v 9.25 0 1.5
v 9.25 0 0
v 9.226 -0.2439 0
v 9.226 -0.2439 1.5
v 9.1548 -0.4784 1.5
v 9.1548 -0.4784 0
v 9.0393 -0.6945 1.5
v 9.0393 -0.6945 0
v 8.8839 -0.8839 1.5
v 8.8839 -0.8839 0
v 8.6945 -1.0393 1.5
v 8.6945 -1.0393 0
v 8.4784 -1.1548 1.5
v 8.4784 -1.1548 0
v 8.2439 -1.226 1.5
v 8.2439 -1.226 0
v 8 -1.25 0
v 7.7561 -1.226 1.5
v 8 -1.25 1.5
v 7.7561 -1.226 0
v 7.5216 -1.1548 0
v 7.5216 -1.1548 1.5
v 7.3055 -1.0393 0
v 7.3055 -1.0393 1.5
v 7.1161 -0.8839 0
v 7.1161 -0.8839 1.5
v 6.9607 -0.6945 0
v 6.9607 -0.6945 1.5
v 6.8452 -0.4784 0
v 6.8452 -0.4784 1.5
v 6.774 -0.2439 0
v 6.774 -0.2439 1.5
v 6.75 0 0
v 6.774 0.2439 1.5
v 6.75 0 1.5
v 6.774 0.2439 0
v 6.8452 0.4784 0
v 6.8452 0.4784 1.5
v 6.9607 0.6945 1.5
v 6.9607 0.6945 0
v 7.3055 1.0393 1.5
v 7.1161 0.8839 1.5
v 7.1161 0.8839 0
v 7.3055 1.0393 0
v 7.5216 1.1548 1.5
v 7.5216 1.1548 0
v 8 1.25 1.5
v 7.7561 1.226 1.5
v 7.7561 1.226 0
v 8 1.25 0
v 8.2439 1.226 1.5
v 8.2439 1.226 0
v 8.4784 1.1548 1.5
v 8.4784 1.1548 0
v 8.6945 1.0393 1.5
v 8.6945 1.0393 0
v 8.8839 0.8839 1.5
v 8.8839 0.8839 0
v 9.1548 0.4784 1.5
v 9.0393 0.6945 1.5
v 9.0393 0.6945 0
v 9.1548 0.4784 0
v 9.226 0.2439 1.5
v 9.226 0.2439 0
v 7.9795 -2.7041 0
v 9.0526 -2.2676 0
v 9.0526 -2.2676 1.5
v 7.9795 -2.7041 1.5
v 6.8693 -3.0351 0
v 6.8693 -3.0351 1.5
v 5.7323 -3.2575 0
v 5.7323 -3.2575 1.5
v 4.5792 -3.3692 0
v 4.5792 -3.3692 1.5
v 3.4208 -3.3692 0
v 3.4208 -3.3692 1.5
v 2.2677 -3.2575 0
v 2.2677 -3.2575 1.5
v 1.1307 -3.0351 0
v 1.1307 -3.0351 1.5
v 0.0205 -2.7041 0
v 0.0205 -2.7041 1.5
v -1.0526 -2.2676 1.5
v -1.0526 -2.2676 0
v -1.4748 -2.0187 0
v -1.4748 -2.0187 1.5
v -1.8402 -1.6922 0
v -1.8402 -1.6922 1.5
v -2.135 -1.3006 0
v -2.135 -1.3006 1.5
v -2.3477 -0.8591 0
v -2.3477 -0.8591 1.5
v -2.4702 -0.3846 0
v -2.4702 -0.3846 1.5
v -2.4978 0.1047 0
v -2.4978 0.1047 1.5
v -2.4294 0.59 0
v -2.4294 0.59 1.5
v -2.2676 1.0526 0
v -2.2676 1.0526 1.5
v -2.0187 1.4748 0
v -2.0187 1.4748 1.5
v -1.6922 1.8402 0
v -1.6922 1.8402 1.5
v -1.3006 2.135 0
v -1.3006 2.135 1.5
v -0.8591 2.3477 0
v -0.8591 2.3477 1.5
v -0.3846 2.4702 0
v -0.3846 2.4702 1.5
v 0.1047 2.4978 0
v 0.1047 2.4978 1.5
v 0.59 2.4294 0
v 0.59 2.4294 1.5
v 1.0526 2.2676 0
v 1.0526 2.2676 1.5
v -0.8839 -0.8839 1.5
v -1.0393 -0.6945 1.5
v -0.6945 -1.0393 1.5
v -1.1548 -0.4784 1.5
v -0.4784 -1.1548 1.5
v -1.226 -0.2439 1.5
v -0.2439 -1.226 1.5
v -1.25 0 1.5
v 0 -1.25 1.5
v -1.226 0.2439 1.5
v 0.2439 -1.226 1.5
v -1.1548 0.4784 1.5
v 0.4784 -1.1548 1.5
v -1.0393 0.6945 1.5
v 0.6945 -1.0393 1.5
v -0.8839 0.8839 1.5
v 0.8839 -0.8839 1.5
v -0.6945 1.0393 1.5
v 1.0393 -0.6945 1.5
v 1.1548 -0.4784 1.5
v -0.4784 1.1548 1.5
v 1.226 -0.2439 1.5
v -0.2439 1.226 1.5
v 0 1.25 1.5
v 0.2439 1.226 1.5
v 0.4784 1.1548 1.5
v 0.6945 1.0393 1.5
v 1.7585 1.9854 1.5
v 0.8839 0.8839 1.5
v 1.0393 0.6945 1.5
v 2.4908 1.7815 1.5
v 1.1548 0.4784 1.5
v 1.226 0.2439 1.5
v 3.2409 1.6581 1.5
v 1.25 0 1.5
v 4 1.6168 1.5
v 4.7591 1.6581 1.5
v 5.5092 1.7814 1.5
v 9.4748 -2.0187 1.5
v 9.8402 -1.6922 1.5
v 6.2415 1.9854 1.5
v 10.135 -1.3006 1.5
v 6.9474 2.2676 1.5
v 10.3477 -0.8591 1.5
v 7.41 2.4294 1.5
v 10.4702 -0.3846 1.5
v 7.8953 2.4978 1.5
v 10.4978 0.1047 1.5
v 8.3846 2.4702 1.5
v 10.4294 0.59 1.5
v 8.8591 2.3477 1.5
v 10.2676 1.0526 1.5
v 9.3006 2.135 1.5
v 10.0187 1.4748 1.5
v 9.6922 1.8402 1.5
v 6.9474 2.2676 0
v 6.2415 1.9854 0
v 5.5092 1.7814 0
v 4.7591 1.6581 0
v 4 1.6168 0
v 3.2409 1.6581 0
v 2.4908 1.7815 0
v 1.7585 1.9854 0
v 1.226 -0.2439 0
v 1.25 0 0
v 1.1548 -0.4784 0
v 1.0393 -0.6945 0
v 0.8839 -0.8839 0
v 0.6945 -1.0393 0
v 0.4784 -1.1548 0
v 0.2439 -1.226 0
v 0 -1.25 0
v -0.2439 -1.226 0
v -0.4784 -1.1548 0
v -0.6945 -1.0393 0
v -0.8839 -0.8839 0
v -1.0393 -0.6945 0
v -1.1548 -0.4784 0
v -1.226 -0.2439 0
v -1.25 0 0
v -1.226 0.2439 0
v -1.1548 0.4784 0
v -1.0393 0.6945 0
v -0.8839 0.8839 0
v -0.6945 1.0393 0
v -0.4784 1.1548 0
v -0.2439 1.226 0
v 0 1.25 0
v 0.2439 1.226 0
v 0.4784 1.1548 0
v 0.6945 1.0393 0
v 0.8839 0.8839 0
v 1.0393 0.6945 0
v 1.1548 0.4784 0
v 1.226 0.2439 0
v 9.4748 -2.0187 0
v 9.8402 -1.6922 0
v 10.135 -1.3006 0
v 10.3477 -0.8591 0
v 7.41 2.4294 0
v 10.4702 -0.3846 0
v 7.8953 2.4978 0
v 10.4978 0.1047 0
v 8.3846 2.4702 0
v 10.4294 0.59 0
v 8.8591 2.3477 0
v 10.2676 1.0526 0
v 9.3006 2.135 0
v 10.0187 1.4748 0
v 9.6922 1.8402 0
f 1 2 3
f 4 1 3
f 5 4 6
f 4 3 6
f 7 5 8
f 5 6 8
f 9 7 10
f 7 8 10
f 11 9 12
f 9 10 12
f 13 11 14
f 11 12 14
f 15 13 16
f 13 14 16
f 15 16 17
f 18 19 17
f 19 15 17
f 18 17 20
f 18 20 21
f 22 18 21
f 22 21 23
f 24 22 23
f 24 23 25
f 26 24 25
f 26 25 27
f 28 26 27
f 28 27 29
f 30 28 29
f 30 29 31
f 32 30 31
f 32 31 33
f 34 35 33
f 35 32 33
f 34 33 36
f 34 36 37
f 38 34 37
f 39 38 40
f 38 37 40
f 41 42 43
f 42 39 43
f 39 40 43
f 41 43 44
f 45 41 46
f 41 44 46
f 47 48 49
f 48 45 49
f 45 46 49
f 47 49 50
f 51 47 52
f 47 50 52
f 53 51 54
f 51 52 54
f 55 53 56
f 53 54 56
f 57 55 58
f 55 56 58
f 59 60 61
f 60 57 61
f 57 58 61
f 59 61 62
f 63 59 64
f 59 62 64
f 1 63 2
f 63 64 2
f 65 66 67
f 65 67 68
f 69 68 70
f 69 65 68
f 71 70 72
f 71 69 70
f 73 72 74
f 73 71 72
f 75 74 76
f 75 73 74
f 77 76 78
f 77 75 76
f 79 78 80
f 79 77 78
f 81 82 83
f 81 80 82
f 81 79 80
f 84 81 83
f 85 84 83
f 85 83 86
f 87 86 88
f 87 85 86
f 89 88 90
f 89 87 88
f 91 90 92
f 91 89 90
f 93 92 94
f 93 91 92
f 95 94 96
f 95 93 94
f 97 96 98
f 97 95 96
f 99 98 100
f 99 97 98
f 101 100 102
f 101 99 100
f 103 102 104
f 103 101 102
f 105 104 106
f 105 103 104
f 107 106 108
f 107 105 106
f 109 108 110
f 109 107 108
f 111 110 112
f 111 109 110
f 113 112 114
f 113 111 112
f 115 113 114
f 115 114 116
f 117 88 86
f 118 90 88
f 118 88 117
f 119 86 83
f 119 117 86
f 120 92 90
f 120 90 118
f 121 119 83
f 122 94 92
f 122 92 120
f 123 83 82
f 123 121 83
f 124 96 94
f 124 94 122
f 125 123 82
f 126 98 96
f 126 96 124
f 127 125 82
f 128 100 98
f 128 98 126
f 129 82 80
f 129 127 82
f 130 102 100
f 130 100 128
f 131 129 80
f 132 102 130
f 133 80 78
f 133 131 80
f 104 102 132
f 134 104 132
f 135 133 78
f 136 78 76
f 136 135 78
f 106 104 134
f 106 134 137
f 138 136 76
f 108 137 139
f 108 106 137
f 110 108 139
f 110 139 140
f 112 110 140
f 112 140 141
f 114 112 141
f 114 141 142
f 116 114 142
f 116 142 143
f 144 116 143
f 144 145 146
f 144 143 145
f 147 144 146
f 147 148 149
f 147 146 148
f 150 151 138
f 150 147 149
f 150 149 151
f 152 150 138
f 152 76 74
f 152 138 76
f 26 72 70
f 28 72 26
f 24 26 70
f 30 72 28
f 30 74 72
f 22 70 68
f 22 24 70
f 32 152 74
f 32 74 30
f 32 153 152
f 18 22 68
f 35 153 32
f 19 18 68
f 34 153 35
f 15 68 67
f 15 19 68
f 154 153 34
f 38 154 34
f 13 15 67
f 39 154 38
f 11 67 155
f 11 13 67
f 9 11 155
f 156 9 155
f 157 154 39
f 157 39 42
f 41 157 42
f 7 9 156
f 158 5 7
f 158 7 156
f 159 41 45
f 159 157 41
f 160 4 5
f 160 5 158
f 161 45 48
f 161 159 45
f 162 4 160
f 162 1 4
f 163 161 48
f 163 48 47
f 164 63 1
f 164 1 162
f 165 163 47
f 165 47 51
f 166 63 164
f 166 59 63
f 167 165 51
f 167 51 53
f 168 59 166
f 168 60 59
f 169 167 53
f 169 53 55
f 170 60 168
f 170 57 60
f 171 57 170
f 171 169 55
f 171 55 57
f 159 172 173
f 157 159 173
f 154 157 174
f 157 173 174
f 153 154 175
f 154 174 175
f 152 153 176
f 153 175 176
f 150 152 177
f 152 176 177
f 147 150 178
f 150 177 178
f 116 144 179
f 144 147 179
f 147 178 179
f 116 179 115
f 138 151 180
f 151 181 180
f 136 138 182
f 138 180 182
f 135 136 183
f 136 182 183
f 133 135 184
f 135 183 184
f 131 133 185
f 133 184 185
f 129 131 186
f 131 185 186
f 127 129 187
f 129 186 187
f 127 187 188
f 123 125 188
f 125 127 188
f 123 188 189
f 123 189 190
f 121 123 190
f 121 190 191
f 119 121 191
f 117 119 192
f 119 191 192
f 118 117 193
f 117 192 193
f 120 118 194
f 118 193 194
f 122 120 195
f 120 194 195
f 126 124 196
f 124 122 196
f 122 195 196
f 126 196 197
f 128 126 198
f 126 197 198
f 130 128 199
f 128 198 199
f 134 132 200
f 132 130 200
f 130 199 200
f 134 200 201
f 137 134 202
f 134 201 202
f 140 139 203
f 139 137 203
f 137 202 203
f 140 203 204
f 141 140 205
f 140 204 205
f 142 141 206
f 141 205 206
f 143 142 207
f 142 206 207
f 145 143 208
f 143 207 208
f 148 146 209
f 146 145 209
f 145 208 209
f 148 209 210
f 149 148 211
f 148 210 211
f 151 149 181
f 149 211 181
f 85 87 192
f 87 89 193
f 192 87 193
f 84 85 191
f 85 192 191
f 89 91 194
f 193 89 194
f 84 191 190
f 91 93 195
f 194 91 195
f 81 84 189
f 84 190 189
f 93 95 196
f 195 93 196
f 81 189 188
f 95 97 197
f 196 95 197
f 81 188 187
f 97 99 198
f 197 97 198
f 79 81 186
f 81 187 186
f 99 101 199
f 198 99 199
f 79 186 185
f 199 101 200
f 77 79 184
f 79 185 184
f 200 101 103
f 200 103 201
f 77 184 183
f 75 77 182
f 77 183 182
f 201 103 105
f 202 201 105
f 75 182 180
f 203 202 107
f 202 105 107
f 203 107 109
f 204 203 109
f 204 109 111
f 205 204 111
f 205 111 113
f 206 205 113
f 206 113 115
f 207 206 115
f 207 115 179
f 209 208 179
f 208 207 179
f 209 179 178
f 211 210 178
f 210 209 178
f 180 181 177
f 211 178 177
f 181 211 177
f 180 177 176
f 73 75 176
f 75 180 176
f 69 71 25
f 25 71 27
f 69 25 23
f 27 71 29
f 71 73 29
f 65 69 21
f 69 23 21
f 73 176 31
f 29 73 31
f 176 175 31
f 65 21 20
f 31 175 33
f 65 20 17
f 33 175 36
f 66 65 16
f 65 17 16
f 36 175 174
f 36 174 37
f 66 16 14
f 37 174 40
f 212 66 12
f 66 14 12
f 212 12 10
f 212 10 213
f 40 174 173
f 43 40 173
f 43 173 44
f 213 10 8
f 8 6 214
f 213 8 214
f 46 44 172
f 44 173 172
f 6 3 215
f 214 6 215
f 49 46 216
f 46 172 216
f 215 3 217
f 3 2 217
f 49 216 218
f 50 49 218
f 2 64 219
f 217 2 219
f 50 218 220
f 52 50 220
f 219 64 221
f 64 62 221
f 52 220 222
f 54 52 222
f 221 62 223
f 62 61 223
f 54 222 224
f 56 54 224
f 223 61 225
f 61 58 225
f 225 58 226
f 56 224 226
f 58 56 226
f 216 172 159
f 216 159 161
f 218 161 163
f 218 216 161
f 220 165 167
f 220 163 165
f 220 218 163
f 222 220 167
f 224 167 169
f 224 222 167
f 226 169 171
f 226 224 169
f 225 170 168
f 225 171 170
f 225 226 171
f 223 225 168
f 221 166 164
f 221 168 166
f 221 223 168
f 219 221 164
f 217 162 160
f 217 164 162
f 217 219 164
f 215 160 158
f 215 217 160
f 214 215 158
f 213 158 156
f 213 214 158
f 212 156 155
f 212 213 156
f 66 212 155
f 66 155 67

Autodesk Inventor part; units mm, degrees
ref_plane "YZ Plane" through (0, 0, 0) normal (1, 0, 0) x (0, 1, 0)
ref_plane "XZ Plane" through (0, 0, 0) normal (0, 1, 0) x (-1, 0, 0)
ref_plane "XY Plane" through (0, 0, 0) normal (0, 0, 1) x (1, 0, 0)
sketch "Sketch1" plane through (0, 0, 0) normal (0, 0, 1) x (1, 0, 0)
  circle A0 centre (0, 0) radius 1.25
  line L0 (0, 0) -> (8, 0) construction
  circle A1 centre (8, 0) radius 1.25
  arc A2 (1.0526, 2.2676) -> (-1.0526, -2.2676) centre (0, 0) ccw
  arc A3 (9.0526, -2.2676) -> (6.9474, 2.2676) centre (8, 0) ccw
  arc A4 (-1.0526, -2.2676) -> (9.0526, -2.2676) centre (4, 8.6168) ccw
  arc A5 (1.0526, 2.2676) -> (4, 1.6168) centre (4, 8.6168) ccw
  arc A6 (4, 1.6168) -> (6.9474, 2.2676) centre (4, 8.6168) ccw
  dimension "d0" = 2.5
  dimension "d1" = 8
  dimension "d8" = 5
  dimension "d20" = 12
extrude "Extrusion1" add sketch "Sketch1" along normal blind 1.5
properties part number "linkageC_mini"
